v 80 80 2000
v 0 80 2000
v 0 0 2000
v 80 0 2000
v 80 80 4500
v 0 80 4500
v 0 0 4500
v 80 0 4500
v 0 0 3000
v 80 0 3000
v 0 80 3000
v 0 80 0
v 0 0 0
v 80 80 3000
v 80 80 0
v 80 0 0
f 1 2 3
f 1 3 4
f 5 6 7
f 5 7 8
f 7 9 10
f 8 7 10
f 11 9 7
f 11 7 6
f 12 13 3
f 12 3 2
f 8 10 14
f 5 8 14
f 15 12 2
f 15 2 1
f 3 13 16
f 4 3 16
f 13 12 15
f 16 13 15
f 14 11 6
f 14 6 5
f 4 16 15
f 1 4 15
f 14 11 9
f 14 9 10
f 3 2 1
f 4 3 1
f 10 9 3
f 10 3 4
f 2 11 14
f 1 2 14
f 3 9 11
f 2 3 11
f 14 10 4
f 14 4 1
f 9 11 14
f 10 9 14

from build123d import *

# Parameters (mm, degrees)
SZKIC1_W                     = 80
SZKIC1_H                     = 80
DODANIE_WYCI_GNI_CIE8_DEPTH  = 2000
DODANIE_WYCI_GNI_CIE9_START  = 2000
SZKIC1_12_W                  = 80
SZKIC1_12_H                  = 80
DODANIE_WYCI_GNI_CIE9_DEPTH  = 1000
DODANIE_WYCI_GNI_CIE10_START = 3000
SZKIC1_13_W                  = 80
SZKIC1_13_H                  = 80
DODANIE_WYCI_GNI_CIE10_DEPTH = 1500


with BuildPart() as part:
    # Szkic1 → Dodanie-wyciągnięcie8 (new body)
    with BuildSketch(Plane.XY):
        with Locations((40, 40)):
            Rectangle(SZKIC1_W, SZKIC1_H)
    extrude(amount=DODANIE_WYCI_GNI_CIE8_DEPTH)


with BuildPart() as body_2:
    # Szkic1<12> → Dodanie-wyciągnięcie9 (new body)
    with BuildSketch(Plane.XY.offset(DODANIE_WYCI_GNI_CIE9_START)):
        with Locations((40, 40)):
            Rectangle(SZKIC1_12_W, SZKIC1_12_H)
    extrude(amount=DODANIE_WYCI_GNI_CIE9_DEPTH)


with BuildPart() as body_3:
    # Szkic1<13> → Dodanie-wyciągnięcie10 (new body)
    with BuildSketch(Plane.XY.offset(DODANIE_WYCI_GNI_CIE10_START)):
        with Locations((40, 40)):
            Rectangle(SZKIC1_13_W, SZKIC1_13_H)
    extrude(amount=DODANIE_WYCI_GNI_CIE10_DEPTH)


solid = Compound([part.part, body_2.part, body_3.part])
